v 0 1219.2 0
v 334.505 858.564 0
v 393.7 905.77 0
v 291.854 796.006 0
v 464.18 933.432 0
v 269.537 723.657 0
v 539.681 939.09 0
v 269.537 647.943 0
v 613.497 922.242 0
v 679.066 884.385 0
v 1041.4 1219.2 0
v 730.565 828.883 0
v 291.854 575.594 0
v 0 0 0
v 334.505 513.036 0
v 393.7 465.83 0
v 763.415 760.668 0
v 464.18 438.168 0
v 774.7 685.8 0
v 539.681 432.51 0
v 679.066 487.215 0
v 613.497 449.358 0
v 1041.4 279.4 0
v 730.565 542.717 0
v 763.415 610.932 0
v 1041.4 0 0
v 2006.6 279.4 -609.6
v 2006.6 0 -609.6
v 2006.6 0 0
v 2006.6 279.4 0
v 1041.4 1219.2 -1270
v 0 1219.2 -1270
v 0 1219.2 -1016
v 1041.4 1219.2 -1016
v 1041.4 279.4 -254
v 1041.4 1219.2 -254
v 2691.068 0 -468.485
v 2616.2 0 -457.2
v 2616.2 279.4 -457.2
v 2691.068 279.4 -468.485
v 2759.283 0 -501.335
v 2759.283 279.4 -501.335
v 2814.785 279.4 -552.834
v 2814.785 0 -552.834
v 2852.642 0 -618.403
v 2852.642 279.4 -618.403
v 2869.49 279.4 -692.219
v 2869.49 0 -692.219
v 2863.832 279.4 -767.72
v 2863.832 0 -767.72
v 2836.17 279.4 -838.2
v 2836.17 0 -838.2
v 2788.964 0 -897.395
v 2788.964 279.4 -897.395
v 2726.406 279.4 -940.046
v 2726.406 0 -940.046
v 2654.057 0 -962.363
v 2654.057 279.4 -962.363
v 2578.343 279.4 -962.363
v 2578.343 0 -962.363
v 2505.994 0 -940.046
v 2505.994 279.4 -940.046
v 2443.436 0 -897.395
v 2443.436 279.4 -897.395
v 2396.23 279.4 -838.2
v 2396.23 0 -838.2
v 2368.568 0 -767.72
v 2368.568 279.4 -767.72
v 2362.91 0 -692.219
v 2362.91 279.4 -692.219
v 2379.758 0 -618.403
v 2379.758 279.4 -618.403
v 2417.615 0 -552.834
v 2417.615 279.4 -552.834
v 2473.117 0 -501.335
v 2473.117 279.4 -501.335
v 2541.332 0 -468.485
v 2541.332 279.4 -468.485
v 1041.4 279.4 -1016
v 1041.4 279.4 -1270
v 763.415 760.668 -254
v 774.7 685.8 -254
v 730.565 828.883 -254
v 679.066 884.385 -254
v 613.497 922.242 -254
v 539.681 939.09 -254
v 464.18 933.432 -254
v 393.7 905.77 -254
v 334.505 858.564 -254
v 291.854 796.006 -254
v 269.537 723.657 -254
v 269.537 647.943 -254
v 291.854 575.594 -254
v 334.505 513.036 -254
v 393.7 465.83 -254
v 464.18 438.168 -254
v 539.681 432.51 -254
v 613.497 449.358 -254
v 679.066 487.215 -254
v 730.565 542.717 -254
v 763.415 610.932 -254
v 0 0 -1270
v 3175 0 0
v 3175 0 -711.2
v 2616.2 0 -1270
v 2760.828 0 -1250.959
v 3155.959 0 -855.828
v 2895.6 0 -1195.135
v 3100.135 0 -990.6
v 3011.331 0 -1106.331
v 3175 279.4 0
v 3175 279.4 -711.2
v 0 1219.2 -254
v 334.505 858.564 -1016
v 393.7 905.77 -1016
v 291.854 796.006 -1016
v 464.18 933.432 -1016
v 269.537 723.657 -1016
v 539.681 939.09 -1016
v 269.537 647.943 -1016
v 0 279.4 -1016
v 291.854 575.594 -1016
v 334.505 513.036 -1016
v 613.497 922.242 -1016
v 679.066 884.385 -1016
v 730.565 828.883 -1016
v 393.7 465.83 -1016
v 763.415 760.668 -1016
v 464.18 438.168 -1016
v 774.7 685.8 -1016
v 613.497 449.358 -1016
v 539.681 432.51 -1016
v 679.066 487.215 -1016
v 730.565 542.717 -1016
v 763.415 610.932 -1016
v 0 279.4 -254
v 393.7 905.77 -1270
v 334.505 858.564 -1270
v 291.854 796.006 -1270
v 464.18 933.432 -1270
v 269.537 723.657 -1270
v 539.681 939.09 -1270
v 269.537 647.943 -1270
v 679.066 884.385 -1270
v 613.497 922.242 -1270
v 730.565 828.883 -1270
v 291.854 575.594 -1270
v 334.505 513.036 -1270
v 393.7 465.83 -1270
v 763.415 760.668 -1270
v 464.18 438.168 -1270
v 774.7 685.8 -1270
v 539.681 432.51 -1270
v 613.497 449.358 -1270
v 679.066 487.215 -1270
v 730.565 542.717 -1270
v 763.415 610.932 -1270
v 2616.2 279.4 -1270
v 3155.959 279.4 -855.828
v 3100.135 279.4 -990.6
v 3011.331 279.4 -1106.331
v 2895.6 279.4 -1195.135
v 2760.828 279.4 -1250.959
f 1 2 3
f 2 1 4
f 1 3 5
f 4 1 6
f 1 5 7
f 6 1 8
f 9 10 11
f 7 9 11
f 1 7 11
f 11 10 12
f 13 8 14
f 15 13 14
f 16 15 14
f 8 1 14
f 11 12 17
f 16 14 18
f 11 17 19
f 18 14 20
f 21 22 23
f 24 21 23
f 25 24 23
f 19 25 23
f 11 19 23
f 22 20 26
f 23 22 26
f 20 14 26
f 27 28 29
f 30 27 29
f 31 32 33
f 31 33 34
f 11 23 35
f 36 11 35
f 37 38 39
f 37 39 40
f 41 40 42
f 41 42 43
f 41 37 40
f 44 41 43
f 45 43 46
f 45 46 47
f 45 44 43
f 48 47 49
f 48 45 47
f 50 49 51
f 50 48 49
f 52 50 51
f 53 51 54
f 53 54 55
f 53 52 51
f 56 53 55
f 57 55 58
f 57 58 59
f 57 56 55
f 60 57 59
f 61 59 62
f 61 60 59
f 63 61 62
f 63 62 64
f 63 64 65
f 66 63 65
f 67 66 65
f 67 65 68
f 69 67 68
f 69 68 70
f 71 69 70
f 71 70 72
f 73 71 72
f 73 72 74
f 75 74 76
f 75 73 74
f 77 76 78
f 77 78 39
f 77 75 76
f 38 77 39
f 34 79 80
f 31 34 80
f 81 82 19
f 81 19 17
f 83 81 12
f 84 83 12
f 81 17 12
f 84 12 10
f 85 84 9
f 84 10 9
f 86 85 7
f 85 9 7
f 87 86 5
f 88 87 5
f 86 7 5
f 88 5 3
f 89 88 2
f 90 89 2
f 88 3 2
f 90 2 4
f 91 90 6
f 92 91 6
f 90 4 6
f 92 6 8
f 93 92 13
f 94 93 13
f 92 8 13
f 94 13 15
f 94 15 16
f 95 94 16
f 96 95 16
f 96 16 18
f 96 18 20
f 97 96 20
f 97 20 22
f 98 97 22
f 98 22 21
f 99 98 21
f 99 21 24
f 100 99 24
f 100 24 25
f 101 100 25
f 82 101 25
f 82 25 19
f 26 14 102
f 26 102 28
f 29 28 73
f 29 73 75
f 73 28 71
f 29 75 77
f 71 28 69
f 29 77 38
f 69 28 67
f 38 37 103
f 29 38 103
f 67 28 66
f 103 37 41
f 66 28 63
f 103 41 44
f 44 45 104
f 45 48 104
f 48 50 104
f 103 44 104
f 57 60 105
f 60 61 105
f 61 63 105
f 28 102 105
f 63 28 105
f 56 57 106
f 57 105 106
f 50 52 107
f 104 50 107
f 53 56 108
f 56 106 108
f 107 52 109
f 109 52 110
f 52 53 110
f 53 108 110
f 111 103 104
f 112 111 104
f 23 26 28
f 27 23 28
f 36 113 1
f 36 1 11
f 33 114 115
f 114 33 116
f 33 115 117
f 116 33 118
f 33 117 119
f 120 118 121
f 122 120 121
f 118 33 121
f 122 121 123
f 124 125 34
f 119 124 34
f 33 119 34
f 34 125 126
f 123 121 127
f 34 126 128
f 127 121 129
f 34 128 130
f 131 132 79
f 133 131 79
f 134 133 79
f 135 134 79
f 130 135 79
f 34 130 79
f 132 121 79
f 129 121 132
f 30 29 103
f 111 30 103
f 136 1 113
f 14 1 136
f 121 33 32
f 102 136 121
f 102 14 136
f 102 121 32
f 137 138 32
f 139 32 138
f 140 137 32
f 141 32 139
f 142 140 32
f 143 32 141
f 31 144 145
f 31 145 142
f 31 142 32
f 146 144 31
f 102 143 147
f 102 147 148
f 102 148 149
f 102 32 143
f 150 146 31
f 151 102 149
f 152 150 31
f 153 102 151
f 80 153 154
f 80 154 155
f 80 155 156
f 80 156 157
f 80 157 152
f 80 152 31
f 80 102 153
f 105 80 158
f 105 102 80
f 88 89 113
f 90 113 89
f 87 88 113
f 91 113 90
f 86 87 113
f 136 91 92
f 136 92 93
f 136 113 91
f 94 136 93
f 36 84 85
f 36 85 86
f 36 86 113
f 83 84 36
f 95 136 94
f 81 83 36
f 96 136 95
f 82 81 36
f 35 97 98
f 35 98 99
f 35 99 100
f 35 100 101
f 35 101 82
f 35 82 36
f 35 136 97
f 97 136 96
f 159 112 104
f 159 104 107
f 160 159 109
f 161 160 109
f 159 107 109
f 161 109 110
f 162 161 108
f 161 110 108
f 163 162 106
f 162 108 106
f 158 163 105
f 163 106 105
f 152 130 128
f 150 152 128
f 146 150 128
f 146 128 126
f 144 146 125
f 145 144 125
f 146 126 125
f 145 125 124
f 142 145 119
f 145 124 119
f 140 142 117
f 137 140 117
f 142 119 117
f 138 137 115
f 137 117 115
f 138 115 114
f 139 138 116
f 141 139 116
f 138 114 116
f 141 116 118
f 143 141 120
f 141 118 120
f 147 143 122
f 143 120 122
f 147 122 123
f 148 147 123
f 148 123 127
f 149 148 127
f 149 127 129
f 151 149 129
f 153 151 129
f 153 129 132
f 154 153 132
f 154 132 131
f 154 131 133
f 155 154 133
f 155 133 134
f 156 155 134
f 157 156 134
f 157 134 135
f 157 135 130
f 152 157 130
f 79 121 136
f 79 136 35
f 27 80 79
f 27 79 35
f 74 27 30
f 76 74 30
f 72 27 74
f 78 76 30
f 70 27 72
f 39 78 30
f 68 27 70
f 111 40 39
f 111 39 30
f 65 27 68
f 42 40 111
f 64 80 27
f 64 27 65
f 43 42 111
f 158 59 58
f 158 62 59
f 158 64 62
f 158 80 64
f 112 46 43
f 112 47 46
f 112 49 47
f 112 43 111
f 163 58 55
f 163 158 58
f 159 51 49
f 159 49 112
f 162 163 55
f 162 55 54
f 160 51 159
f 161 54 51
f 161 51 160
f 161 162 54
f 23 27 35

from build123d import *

# Parameters (mm, degrees)
SKETCH1_R           = 254
BOSS_EXTRUDE1_DEPTH = 279.4
SKETCH2_W           = 1041.4
SKETCH2_H           = 254
BOSS_EXTRUDE2_DEPTH = 939.8
SKETCH3_R           = 254
CUT_EXTRUDE1_DEPTH  = 1270


with BuildPart() as part:
    # Sketch1 → Boss-Extrude1 (new body)
    with BuildSketch(Plane(origin=(0, 0, 0), x_dir=(1, 0, 0), z_dir=(0, 1, 0))):
        with BuildLine():
            Line((0, 0), (1041.4, 0))
            Line((1041.4, 0), (2006.6, 609.6))
            Line((2006.6, 609.6), (2006.6, 0))
            Line((2006.6, 0), (3175, 0))
            Line((3175, 0), (3175, 711.2))
            ThreePointArc((3175, 711.2), (3011.331269327, 1106.331269327), (2616.2, 1270))
            Line((2616.2, 1270), (0, 1270))
            Line((0, 1270), (0, 0))
        make_face()
        with Locations(Location((2616.2, 711.2, 0), (0, 0, 270))):
            Circle(SKETCH1_R, mode=Mode.SUBTRACT)
    extrude(amount=BOSS_EXTRUDE1_DEPTH)

    # Sketch2 → Boss-Extrude2 (add)
    with BuildSketch(Plane(origin=(0, 279.4, 0), x_dir=(1, 0, 0), z_dir=(0, 1, 0))):
        with Locations((520.7, 1143)):
            Rectangle(SKETCH2_W, SKETCH2_H)
        with Locations((520.7, 127)):
            Rectangle(SKETCH2_W, SKETCH2_H)
    extrude(amount=BOSS_EXTRUDE2_DEPTH)

    # Sketch3 → Cut-Extrude1 (cut)
    with BuildSketch(Plane.XY):
        with Locations((520.7, 685.8)):
            Circle(SKETCH3_R)
    extrude(amount=-CUT_EXTRUDE1_DEPTH, mode=Mode.SUBTRACT)


solid = part.part
